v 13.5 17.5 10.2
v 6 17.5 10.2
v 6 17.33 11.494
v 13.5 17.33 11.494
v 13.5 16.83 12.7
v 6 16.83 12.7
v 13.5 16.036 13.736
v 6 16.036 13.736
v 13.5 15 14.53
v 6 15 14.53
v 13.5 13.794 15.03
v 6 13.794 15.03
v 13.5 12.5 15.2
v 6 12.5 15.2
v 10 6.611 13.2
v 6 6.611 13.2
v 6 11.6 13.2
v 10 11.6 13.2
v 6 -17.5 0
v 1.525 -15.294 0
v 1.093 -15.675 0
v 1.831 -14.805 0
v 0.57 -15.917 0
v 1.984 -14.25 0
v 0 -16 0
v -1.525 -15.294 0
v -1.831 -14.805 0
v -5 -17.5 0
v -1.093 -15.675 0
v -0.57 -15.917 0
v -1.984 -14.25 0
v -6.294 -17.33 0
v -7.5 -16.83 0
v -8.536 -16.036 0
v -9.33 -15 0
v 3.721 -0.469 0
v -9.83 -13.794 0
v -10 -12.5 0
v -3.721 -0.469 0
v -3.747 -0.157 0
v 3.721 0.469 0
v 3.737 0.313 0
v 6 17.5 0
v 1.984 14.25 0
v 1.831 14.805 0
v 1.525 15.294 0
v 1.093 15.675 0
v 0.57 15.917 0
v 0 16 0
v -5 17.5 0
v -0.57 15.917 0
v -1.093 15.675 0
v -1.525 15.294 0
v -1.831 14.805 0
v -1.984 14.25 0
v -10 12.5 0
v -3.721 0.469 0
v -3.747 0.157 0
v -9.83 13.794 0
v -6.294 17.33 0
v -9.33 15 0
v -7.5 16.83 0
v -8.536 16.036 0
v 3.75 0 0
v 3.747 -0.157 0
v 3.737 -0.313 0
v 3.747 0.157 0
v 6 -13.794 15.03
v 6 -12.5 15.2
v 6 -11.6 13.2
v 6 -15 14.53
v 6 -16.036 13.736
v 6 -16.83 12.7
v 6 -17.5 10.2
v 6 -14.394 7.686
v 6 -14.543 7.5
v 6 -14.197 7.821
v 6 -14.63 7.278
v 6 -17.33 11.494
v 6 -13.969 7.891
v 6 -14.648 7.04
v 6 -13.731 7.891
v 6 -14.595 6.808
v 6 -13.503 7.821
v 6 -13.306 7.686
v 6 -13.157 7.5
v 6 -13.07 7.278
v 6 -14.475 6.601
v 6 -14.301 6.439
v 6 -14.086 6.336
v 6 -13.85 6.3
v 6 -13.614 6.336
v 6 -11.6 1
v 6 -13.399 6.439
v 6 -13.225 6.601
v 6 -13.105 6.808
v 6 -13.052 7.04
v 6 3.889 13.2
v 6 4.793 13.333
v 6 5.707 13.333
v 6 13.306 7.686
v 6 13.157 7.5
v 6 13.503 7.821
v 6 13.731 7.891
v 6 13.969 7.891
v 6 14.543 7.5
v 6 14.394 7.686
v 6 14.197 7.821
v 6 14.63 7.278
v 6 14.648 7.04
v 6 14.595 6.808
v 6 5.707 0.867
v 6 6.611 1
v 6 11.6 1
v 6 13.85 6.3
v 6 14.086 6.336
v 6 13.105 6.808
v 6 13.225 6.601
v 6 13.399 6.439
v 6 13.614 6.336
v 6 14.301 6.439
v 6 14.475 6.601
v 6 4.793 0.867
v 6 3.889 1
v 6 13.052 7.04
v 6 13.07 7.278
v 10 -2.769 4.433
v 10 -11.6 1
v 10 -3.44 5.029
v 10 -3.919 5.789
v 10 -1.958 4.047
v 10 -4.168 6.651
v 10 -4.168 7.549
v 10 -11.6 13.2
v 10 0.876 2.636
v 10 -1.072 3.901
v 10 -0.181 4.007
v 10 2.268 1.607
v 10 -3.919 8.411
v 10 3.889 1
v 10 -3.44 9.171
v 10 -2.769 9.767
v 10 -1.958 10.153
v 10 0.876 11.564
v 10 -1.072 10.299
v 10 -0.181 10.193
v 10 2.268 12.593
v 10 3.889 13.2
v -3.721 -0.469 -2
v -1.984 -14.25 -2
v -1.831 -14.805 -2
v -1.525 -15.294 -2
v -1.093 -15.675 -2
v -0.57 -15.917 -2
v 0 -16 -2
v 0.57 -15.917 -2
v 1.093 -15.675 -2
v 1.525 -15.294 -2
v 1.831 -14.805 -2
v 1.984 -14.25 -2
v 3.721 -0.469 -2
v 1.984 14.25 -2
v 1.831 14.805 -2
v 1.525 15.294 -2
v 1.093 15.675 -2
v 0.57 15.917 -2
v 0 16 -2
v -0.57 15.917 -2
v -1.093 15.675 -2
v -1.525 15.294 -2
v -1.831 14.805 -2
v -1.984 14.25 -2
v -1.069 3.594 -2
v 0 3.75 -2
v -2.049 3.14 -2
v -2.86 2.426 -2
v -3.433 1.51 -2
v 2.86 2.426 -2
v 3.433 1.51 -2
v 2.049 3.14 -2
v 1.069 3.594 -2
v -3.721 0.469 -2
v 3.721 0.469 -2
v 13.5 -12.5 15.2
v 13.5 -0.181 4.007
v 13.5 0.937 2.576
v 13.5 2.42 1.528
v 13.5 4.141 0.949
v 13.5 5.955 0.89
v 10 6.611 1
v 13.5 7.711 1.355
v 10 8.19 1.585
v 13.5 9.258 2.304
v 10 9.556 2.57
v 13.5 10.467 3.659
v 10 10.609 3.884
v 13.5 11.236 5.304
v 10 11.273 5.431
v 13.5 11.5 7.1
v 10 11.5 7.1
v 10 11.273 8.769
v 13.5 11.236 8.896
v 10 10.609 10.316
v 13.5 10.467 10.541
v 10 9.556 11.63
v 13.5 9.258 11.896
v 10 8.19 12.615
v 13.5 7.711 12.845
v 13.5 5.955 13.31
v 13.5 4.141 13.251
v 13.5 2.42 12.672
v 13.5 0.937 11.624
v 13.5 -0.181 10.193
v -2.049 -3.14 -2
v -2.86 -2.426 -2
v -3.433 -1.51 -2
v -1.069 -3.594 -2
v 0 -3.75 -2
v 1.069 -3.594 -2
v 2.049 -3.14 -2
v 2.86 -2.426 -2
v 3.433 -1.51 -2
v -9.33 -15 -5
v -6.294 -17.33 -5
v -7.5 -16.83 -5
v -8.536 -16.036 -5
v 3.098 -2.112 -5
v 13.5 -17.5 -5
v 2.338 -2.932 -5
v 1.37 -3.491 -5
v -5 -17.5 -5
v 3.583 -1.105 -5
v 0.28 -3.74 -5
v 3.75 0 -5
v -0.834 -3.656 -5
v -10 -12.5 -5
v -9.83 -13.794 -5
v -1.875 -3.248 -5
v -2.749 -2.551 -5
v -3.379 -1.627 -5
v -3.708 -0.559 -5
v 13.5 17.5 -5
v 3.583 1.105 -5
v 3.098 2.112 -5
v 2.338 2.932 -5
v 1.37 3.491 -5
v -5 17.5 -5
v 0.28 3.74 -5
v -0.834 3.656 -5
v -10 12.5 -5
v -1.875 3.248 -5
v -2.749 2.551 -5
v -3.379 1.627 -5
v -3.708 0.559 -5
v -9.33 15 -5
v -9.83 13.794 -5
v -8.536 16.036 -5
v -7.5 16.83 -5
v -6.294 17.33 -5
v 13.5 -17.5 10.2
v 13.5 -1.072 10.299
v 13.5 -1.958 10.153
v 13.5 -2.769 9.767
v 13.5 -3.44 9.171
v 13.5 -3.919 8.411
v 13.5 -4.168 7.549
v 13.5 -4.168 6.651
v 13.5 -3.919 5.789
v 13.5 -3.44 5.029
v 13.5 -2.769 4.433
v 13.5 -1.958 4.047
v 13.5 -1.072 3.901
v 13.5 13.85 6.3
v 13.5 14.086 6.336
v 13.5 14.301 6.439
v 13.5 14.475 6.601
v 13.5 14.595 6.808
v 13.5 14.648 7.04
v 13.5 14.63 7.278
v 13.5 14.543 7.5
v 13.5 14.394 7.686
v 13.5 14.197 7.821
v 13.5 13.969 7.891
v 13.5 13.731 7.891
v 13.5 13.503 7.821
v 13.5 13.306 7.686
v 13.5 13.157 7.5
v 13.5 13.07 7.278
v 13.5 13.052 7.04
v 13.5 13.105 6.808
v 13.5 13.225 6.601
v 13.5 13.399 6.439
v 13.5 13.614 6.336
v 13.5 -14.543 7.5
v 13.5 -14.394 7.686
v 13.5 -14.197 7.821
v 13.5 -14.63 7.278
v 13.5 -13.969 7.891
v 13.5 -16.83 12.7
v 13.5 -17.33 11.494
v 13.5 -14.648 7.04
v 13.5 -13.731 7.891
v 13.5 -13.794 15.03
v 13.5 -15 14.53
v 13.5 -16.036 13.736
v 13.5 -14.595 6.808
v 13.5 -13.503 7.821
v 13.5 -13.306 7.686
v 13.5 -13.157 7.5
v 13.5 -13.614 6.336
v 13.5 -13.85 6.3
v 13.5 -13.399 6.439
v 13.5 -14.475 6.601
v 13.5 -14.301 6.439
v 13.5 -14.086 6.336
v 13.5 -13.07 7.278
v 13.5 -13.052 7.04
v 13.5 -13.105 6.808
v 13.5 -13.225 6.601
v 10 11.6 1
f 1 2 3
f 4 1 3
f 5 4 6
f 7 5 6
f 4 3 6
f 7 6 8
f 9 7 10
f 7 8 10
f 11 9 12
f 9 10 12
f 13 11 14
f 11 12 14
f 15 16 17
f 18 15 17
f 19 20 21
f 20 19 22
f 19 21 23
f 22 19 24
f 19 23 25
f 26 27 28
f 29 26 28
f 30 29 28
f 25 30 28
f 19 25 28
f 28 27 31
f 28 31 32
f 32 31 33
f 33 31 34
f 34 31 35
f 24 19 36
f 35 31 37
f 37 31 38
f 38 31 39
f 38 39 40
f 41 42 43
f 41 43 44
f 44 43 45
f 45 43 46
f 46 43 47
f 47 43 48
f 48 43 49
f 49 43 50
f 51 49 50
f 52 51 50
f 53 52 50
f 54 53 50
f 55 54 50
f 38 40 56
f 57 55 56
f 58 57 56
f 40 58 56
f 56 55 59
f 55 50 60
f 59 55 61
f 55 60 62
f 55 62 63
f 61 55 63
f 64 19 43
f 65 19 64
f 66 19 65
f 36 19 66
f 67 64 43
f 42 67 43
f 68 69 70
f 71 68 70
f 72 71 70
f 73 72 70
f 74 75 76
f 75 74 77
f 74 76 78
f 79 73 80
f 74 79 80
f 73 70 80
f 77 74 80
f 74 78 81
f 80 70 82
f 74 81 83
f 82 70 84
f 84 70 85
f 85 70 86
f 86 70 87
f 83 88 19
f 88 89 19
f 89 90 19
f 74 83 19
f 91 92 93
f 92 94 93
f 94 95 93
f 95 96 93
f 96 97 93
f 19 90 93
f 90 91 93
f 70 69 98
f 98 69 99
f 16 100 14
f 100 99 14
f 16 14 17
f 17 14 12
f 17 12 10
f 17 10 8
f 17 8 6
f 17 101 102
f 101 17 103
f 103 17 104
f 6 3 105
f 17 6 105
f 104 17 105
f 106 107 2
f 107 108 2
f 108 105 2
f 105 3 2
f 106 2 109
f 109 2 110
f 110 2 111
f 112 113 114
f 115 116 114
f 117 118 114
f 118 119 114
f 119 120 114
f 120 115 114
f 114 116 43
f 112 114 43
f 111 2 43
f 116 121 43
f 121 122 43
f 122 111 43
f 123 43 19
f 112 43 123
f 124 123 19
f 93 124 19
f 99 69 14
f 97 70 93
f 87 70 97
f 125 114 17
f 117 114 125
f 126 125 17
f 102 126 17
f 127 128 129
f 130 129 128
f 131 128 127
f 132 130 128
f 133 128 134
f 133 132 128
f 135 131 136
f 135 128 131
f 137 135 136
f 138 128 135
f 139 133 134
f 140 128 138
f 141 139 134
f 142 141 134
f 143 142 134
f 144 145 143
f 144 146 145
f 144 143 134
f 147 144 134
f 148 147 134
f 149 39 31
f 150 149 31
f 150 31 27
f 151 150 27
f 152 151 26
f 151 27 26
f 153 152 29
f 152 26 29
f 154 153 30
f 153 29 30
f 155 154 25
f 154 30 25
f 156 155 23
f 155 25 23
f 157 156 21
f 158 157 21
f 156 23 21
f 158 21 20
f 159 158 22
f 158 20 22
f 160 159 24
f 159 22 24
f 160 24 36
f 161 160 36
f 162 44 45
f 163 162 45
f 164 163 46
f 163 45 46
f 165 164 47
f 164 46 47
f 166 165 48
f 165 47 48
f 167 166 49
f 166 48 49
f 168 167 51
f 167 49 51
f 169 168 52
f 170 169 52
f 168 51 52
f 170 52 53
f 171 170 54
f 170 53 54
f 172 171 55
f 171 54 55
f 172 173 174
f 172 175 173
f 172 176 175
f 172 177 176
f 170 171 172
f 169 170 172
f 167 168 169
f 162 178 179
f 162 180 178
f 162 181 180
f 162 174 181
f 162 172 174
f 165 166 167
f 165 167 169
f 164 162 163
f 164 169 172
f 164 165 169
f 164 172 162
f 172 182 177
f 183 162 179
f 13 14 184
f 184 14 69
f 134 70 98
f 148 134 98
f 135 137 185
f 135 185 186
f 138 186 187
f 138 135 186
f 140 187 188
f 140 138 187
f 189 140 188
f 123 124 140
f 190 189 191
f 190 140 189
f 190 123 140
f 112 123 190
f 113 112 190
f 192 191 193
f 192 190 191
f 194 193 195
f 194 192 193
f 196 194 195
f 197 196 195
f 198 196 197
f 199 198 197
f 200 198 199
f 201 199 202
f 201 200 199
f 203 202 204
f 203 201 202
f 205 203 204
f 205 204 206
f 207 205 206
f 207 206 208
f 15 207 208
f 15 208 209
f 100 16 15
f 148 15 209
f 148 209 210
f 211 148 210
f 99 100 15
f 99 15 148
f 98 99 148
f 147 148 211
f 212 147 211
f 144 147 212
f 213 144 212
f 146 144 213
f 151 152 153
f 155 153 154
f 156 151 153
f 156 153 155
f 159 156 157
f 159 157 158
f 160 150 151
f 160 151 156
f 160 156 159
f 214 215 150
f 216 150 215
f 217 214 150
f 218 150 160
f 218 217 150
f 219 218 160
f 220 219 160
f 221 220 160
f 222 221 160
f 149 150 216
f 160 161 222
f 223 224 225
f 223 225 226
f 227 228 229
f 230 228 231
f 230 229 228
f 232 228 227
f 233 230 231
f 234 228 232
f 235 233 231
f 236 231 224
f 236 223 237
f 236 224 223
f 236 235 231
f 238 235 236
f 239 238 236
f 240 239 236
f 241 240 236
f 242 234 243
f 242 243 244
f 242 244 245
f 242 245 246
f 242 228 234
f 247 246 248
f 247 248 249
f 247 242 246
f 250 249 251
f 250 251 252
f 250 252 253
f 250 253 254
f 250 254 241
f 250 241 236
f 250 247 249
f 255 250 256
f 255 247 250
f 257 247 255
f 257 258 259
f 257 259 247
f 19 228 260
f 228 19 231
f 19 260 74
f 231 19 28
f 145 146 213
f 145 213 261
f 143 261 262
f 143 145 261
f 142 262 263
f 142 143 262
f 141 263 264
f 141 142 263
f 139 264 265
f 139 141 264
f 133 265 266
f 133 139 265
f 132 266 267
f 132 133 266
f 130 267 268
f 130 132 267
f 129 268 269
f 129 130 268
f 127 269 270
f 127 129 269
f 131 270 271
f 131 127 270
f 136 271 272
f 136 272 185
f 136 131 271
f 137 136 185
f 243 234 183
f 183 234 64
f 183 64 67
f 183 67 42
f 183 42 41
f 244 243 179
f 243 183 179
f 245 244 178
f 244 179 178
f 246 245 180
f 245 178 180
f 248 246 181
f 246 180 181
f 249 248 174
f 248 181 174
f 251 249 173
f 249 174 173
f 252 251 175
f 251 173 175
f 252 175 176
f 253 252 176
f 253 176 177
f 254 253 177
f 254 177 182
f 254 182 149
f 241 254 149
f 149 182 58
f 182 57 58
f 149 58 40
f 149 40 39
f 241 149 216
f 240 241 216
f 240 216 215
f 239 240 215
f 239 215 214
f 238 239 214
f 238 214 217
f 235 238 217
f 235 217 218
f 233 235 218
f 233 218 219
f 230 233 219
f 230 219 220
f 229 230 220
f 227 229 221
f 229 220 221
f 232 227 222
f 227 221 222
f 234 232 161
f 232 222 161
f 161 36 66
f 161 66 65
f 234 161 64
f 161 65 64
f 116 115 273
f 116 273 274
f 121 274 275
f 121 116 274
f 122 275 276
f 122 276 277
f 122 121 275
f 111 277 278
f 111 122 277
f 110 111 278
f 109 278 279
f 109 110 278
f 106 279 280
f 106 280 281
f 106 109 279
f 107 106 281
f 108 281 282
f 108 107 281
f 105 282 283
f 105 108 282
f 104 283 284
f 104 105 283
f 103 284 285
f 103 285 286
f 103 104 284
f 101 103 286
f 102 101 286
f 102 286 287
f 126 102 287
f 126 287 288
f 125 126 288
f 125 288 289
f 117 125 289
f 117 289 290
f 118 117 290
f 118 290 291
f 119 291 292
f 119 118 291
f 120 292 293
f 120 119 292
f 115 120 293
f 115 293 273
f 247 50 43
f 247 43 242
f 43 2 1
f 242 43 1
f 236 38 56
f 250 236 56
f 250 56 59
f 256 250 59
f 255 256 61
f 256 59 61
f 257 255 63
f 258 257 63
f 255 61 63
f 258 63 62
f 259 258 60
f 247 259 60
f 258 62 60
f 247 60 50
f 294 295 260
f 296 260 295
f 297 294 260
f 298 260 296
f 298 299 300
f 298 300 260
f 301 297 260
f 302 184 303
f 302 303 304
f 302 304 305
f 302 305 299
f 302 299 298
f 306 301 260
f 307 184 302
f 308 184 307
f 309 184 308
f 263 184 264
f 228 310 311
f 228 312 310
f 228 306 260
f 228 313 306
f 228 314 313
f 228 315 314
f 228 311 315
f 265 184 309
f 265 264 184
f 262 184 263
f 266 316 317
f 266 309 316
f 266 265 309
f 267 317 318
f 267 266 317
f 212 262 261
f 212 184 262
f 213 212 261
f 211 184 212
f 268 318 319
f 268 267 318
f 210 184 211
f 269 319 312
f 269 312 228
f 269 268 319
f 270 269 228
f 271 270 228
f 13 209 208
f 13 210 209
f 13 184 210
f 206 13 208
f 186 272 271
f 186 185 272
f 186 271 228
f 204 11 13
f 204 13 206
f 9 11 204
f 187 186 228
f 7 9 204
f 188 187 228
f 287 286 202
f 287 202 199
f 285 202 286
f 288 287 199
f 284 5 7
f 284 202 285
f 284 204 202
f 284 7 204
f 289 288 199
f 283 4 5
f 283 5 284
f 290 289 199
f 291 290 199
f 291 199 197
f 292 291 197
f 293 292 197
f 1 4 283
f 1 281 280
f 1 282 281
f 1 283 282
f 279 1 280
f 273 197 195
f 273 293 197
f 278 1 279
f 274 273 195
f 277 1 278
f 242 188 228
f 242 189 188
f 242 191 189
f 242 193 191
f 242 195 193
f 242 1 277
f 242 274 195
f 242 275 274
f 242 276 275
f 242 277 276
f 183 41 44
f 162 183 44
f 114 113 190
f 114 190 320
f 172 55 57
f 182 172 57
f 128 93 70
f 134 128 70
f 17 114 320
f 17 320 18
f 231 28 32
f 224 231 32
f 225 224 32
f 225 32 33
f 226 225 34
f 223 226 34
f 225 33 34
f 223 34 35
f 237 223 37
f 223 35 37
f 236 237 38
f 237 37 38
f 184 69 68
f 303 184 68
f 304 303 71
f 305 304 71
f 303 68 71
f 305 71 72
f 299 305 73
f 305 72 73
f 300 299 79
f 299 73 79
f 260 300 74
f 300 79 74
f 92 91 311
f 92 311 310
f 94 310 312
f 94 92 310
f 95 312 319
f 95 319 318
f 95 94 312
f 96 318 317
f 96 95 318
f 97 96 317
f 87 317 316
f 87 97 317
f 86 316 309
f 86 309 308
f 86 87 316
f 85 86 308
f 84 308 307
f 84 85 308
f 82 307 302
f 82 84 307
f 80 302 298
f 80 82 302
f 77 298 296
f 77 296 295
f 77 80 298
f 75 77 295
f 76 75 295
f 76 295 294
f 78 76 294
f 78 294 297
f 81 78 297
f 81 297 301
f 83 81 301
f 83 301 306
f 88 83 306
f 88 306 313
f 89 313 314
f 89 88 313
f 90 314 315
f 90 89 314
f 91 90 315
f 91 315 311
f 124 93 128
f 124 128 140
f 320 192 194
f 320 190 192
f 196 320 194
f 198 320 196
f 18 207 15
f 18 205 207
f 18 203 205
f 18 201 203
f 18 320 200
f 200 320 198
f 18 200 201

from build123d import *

# Parameters (mm, degrees)
SKETCH1_R                = 3.75
BOSS_EXTRUDE1_DEPTH      = 5
CUT_EXTRUDE2_DEPTH       = 2
BOSS_EXTRUDE2_DEPTH      = 3.5
BOSS_EXTRUDE2_DEPTH_BACK = 4
SKETCH5_R                = 0.8
SKETCH6_W                = 12.2
SKETCH6_H                = 23.2
CUT_EXTRUDE3_DEPTH       = 4


with BuildPart() as part:
    # Sketch1 → Boss-Extrude1 (new body)
    with BuildSketch(Plane.XY):
        with BuildLine():
            Line((10, -17.5), (-5, -17.5))
            ThreePointArc((-5, -17.5), (-8.535533906, -16.035533906), (-10, -12.5))
            Line((-10, -12.5), (-10, 12.5))
            ThreePointArc((-10, 12.5), (-8.535533906, 16.035533906), (-5, 17.5))
            Line((-5, 17.5), (10, 17.5))
            Line((10, 17.5), (10, -17.5))
        make_face()
        Circle(SKETCH1_R, mode=Mode.SUBTRACT)
    extrude(amount=-BOSS_EXTRUDE1_DEPTH)

    # Sketch3 → Cut-Extrude2 (cut)
    with BuildSketch(Plane.XY):
        with BuildLine():
            Line((-1.984313483, 14.25), (-3.720587781, 0.46875))
            ThreePointArc((-3.720587781, 0.46875), (-3.75, 0), (-3.720587781, -0.46875))
            Line((-3.720587781, -0.46875), (-1.984313483, -14.25))
            ThreePointArc((-1.984313483, -14.25), (0, -16), (1.984313483, -14.25))
            Line((1.984313483, -14.25), (3.720587781, -0.46875))
            ThreePointArc((3.720587781, -0.46875), (3.75, 0), (3.720587781, 0.46875))
            Line((3.720587781, 0.46875), (1.984313483, 14.25))
            ThreePointArc((1.984313483, 14.25), (0, 16), (-1.984313483, 14.25))
        make_face()
    extrude(amount=-CUT_EXTRUDE2_DEPTH, mode=Mode.SUBTRACT)

    # Sketch5 → Boss-Extrude2 (add, two sides: drawn at the far end of the back side and taken through both)
    with BuildSketch(Plane(origin=(10, 0, 0), x_dir=(0, 0, -1), z_dir=(1, 0, 0)).offset(-BOSS_EXTRUDE2_DEPTH_BACK)):
        with BuildLine():
            Line((5, 17.5), (-10.2, 17.5))
            ThreePointArc((-10.2, 17.5), (-13.735533906, 16.035533906), (-15.2, 12.5))
            Line((-15.2, 12.5), (-15.2, -12.5))
            ThreePointArc((-15.2, -12.5), (-13.735533906, -16.035533906), (-10.2, -17.5))
            Line((-10.2, -17.5), (5, -17.5))
            Line((5, -17.5), (5, 17.5))
        make_face()
        with Locations((-7.1, 13.85)):
            Circle(SKETCH5_R, mode=Mode.SUBTRACT)
        with Locations((-7.1, -13.85)):
            Circle(SKETCH5_R, mode=Mode.SUBTRACT)
        with BuildLine():
            ThreePointArc((-4.006634299, -0.1808), (-7.1, 11.5), (-10.193365701, -0.1808))
            ThreePointArc((-10.193365701, -0.1808), (-7.1, -4.2), (-4.006634299, -0.1808))
        make_face(mode=Mode.SUBTRACT)
    extrude(amount=BOSS_EXTRUDE2_DEPTH + BOSS_EXTRUDE2_DEPTH_BACK)

    # Sketch6 → Cut-Extrude3 (cut)
    with BuildSketch(Plane.ZY.offset(-6)):
        with Locations((7.1, 0)):
            Rectangle(SKETCH6_W, SKETCH6_H)
    extrude(amount=-CUT_EXTRUDE3_DEPTH, mode=Mode.SUBTRACT)


solid = part.part
